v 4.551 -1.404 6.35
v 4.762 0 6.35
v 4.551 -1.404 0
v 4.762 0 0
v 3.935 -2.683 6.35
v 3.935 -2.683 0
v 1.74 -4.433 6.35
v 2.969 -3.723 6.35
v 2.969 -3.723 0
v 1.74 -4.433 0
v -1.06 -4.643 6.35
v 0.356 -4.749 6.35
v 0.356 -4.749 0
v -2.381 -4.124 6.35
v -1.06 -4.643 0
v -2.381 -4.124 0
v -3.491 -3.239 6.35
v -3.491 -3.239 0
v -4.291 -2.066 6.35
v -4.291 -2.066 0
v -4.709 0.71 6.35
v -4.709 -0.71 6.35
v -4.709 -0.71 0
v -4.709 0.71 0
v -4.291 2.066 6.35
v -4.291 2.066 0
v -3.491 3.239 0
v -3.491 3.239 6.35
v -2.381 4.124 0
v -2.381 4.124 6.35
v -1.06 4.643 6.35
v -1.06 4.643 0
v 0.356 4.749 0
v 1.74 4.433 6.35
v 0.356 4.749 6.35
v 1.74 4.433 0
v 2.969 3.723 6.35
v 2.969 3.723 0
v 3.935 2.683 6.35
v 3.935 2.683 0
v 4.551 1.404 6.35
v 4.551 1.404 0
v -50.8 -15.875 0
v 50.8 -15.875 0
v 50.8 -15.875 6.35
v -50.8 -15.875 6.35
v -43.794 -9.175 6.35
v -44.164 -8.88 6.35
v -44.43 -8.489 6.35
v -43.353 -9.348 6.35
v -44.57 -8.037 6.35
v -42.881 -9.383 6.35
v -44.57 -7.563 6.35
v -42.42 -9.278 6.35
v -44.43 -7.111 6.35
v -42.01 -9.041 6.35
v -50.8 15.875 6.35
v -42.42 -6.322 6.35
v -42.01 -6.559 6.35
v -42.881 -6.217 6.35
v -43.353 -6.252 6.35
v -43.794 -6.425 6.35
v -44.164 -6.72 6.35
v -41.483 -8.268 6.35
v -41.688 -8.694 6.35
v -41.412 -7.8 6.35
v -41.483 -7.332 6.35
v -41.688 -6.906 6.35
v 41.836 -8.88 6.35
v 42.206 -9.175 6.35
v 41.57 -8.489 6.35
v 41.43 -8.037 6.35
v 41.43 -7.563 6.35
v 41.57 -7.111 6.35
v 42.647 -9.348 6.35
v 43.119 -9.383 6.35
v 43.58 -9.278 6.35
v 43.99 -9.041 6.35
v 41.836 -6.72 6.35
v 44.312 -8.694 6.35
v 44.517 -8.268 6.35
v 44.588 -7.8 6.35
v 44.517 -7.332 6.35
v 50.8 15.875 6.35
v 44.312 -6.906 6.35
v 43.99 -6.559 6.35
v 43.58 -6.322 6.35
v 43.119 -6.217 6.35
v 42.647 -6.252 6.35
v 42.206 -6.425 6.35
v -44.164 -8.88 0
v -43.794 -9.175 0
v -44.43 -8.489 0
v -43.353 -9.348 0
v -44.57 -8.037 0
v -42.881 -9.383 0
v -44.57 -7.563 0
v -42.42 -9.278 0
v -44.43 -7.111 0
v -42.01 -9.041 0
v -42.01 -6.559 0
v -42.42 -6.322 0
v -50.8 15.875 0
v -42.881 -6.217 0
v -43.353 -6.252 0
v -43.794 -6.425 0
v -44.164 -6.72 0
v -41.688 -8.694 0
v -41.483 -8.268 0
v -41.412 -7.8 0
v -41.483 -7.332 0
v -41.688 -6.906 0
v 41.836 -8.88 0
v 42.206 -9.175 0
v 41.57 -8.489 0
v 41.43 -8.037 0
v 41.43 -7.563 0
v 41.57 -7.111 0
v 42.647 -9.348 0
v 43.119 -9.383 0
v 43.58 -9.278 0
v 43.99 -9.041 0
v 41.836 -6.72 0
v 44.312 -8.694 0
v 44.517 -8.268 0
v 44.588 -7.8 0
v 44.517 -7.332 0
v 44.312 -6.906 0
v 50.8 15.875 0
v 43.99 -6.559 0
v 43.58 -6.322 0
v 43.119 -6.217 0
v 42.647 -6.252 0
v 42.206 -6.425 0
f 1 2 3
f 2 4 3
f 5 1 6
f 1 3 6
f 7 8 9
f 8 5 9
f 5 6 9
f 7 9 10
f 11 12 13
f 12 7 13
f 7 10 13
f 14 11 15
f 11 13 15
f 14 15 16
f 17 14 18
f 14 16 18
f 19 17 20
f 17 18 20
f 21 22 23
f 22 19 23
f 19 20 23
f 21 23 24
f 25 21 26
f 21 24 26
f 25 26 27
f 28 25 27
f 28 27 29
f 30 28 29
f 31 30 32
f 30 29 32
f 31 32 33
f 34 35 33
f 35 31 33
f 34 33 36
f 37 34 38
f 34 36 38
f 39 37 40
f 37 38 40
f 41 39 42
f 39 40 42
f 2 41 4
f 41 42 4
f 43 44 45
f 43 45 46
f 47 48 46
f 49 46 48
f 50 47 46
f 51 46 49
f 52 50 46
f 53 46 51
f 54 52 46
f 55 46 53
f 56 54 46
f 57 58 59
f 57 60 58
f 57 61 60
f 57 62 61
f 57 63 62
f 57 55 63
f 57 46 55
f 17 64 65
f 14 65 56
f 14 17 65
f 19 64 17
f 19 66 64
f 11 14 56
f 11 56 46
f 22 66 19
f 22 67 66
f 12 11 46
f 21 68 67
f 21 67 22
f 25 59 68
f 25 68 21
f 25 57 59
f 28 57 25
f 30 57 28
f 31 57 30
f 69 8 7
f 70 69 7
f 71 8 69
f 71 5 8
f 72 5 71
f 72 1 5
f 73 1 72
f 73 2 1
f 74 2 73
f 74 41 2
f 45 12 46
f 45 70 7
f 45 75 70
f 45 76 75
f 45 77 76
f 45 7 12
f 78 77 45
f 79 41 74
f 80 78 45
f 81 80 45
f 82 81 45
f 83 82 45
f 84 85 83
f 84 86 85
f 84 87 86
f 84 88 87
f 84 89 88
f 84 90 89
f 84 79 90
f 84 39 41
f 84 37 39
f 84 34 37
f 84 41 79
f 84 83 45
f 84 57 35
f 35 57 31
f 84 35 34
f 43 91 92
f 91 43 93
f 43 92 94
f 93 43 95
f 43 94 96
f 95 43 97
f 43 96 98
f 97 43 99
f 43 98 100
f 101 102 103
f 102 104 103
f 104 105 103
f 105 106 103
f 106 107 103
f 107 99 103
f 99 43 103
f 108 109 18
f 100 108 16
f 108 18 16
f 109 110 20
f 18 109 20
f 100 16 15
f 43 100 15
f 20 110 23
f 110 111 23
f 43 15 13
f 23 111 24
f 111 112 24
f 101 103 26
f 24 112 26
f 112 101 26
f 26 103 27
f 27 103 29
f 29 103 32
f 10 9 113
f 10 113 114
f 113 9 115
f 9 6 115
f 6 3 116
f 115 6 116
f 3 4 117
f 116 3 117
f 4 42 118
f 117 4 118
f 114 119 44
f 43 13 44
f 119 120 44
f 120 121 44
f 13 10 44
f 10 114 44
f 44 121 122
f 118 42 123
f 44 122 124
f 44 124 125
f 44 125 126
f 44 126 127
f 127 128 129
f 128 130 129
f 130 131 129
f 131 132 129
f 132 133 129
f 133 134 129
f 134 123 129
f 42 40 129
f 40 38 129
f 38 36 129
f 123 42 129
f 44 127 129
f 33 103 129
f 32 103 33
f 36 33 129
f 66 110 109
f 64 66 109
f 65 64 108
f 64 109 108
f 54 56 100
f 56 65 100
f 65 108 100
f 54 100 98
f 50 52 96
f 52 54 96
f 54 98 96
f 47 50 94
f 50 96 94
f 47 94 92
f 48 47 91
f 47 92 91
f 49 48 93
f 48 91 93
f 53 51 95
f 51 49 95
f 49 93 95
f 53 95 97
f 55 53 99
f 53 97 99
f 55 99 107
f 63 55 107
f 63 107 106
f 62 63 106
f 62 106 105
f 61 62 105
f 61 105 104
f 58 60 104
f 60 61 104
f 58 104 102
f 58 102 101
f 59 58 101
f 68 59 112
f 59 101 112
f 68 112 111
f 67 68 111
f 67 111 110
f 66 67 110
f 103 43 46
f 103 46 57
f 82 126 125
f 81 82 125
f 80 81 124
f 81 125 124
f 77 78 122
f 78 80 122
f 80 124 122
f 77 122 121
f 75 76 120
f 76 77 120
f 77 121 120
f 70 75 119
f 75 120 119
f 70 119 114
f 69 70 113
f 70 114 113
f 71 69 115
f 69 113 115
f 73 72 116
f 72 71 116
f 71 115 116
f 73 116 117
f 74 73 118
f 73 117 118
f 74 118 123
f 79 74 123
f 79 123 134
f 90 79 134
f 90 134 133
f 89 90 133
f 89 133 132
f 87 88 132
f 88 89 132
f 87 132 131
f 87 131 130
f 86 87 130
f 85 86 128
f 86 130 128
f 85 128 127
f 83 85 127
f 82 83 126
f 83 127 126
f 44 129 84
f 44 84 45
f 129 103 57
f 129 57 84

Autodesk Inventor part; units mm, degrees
ref_plane "YZ Plane" through (0, 0, 0) normal (1, 0, 0) x (0, 1, 0)
ref_plane "XZ Plane" through (0, 0, 0) normal (0, 1, 0) x (-1, 0, 0)
ref_plane "XY Plane" through (0, 0, 0) normal (0, 0, 1) x (1, 0, 0)
sketch "Sketch1" plane through (0, 0, 0) normal (0, 0, 1) x (1, 0, 0)
  point P0 (0, 0)
sketch "Sketch2" plane through (0, 0, 0) normal (0, 0, 1) x (1, 0, 0)
  line L0 (-50.8, 15.875) -> (50.8, 15.875)
  line L1 (50.8, 15.875) -> (50.8, -15.875)
  line L2 (50.8, -15.875) -> (-50.8, -15.875)
  line L3 (-50.8, -15.875) -> (-50.8, 15.875)
  circle A0 centre (0, 0) radius 4.7625
  circle A1 centre (43, -7.8) radius 1.5875
  circle A2 centre (-43, -7.8) radius 1.5875
  dimension "d0" = 101.6
  dimension "d1" = 31.75
  dimension "d3" = 50.8
  dimension "d4" = 15.875
  dimension "d5" = 15.875
  dimension "d6" = 9.525
  dimension "d7" = 3.175
  dimension "d8" = 3.175
  dimension "d9" = 7.8
  dimension "d10" = 43
  dimension "d11" = 43
  dimension "d12" = 7.8
extrude "Extrusion1" add sketch "Sketch2" along normal blind 6.35
properties part number "structural small" material "Polycarbonate, Clear"
